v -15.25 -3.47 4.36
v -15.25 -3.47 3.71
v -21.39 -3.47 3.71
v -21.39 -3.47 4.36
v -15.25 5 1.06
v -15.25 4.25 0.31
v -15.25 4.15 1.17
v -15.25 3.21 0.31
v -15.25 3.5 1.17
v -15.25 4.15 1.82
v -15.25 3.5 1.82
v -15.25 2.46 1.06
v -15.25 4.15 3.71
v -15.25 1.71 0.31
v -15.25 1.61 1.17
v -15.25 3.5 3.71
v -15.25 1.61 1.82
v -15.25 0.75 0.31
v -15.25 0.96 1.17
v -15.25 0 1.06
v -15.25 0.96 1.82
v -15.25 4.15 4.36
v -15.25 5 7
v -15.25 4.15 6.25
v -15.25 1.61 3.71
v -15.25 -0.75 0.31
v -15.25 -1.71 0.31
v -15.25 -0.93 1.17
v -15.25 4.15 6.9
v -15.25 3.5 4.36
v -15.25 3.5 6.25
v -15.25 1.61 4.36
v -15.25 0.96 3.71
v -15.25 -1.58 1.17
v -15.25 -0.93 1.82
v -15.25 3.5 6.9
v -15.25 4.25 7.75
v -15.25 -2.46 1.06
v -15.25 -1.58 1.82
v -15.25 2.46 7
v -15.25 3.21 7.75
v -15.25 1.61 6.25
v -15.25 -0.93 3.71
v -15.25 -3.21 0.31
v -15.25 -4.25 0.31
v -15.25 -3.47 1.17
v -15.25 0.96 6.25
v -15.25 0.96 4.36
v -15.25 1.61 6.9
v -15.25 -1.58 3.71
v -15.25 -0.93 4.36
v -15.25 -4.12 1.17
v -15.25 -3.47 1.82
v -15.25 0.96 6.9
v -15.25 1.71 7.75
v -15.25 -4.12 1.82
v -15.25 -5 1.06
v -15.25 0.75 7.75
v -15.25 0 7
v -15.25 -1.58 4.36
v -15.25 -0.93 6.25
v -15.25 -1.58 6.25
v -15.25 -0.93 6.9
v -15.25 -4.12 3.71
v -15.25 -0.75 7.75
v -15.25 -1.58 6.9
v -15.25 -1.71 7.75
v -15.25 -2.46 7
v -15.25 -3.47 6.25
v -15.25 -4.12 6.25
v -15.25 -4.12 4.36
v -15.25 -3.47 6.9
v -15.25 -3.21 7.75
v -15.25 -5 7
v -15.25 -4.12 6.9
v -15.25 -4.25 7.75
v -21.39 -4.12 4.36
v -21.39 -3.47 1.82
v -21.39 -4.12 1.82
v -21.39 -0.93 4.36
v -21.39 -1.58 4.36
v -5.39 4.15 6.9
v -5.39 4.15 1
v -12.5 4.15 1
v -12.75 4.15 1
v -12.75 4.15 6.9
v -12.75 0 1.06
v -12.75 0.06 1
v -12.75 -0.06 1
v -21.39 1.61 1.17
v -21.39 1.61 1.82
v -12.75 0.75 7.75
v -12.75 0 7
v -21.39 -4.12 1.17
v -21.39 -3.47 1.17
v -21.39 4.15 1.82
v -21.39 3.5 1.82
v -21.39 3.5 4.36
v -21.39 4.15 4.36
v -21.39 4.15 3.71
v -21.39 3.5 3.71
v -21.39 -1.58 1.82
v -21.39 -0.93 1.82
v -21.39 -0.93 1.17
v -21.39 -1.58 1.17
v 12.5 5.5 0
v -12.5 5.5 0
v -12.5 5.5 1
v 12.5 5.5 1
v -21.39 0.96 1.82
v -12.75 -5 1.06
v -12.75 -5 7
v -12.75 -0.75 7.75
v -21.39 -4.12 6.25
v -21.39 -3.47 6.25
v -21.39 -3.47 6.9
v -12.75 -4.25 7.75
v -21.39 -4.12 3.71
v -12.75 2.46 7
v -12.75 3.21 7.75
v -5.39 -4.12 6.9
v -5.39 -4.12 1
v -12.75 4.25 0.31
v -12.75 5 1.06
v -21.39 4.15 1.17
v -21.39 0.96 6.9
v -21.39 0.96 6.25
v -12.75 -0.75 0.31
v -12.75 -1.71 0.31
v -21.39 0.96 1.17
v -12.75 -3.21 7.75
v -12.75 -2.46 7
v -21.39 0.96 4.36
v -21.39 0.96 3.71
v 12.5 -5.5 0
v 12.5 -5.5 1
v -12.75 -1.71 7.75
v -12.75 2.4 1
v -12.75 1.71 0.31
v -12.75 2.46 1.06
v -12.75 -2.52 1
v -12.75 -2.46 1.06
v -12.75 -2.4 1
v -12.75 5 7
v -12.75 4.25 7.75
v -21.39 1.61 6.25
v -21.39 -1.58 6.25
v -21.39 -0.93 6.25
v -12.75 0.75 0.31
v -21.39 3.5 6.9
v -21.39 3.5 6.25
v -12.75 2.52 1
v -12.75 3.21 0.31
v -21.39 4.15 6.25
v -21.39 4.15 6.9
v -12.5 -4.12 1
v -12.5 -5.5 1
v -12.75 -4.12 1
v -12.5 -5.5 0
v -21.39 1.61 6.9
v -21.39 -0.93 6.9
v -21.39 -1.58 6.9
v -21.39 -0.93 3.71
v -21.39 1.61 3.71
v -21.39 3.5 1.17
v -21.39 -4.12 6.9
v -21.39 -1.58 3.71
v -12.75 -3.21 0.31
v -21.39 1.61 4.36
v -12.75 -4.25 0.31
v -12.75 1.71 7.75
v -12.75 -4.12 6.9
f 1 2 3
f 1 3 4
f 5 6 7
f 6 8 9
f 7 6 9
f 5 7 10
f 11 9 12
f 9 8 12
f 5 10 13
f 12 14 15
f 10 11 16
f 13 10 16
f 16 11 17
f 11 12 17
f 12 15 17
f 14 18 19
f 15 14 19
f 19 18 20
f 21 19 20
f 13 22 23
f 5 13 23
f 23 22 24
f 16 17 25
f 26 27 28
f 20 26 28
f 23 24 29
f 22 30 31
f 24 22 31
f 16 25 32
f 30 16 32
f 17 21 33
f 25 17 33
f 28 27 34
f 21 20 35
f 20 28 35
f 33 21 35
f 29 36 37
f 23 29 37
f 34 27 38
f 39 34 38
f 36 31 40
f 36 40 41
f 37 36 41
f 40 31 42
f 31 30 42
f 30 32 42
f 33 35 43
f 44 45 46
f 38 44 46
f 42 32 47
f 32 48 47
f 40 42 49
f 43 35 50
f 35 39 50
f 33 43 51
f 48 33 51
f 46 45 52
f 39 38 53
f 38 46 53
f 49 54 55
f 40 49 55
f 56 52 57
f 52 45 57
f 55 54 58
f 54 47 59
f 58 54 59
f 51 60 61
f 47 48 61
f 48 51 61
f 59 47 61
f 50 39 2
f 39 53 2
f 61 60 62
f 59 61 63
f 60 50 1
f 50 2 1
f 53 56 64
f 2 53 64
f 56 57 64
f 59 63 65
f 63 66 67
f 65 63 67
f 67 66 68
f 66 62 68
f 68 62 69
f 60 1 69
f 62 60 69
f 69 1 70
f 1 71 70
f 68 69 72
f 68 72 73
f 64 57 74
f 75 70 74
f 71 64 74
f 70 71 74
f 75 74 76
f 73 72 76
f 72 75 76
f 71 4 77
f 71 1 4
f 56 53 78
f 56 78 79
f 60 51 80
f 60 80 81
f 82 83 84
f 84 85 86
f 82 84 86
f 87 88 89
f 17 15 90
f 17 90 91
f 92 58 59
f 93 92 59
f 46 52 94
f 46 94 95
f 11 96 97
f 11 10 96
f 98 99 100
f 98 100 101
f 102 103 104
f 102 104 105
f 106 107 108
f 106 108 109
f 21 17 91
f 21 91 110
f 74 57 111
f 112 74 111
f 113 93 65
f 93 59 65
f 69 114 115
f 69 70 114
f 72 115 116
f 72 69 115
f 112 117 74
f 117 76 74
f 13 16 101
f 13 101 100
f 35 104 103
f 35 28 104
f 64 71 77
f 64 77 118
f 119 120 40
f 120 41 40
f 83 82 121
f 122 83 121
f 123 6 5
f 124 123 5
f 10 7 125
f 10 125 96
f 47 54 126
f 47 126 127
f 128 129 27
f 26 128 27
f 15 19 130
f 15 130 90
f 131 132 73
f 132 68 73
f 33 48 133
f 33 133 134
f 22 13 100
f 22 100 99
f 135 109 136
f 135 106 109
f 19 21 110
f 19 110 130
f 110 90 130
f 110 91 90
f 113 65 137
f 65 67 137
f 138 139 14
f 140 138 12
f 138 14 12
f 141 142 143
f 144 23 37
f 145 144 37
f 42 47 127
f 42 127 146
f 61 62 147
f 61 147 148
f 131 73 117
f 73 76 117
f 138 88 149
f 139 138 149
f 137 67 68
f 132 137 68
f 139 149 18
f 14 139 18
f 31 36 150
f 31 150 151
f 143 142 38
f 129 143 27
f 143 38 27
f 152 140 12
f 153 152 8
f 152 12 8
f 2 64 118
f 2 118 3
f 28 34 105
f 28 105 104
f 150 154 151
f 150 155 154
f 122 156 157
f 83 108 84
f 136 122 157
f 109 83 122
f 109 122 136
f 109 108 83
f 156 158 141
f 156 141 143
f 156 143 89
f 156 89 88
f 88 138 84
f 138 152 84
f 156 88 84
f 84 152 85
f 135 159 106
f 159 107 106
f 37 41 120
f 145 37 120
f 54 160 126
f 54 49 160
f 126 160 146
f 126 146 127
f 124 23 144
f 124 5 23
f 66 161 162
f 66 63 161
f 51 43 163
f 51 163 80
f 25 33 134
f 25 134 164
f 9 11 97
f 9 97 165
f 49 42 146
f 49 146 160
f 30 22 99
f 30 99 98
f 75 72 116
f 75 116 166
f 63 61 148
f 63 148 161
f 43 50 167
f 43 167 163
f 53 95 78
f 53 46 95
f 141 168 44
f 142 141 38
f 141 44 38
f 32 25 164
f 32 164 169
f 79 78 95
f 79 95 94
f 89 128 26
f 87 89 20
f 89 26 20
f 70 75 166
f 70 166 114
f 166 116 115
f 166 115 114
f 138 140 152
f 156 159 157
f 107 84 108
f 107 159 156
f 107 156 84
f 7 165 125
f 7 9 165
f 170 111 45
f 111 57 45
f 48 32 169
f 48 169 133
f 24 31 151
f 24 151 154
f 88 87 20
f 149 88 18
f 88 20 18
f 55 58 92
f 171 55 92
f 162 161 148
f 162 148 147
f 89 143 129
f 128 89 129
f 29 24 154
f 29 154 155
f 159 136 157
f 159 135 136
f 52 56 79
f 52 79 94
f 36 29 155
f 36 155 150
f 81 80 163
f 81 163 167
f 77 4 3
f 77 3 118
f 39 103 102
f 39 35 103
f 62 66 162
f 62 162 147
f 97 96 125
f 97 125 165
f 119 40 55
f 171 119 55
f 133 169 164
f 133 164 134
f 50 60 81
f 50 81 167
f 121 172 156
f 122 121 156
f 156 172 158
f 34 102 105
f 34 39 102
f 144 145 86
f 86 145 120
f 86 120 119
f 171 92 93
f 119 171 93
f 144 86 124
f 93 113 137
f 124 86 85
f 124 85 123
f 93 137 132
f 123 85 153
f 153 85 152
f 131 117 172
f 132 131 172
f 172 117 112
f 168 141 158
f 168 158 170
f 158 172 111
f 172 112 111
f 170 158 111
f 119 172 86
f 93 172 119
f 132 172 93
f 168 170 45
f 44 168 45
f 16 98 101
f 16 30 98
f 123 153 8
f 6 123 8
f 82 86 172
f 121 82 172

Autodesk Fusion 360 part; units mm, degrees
sketch "Sketch1" plane through (0, 0, 0) normal (0, 0, 1) x (1, 0, 0)
  line L0 (-12.5, 5.5) -> (12.5, 5.5)
  line L1 (12.5, 5.5) -> (12.5, -5.5)
  line L2 (12.5, -5.5) -> (-12.5, -5.5)
  line L3 (-12.5, -5.5) -> (-12.5, 5.5)
  line L4 (-12.5, 5.5) -> (12.5, -5.5) construction
  line L5 (12.5, 5.5) -> (-12.5, -5.5) construction
  line L6 (-12.5, 5.5) -> (-21.5, 5.5) construction
  line L7 (-21.5, 5.5) -> (-21.5, -5.5) construction
  line L8 (-21.5, -5.5) -> (-12.5, -5.5) construction
  dimension "d1" = 11
  dimension "d2" = 25
  dimension "d5" = 34
extrude "Extrude1" add sketch "Sketch1" along normal blind 1 makes body 1
sketch "Sketch2" plane through (0, 0, 0) normal (0, 1, 0) x (1, 0, 0)
  line L0 (-15.25, -7.75) -> (-12.75, -7.75)
  line L1 (-12.75, -7.75) -> (-12.75, -0.31)
  line L2 (-12.75, -0.31) -> (-15.25, -0.31)
  line L3 (-15.25, -0.31) -> (-15.25, -7.75)
  point P0 (12.5, 0)
  dimension "d6" = 2.5
  dimension "d7" = 7.44
  dimension "d8" = 7.75
  dimension "d9" = 27.75
extrude "Extrude2" add sketch "Sketch2" along normal mid plane 10 separate body makes body 2
sketch "Sketch3" plane through (-15.25, 0, 0) normal (-1, 0, 0) x (0, -1, 0)
  line L0 (5, 7.75) -> (-5, 7.75)
  line L1 (-5, 7.75) -> (-5, 0.31)
  line L2 (-5, 0.31) -> (5, 0.31)
  line L3 (5, 0.31) -> (5, 7.75)
  line L4 (-4.15, 6.9) -> (-3.5, 6.9)
  line L5 (-3.5, 6.9) -> (-3.5, 6.25)
  line L6 (-3.5, 6.25) -> (-4.15, 6.25)
  line L7 (-4.15, 6.25) -> (-4.15, 6.9)
  line L8 (-1.61, 6.9) -> (-0.96, 6.9)
  line L9 (-0.96, 6.9) -> (-0.96, 6.25)
  line L10 (-0.96, 6.25) -> (-1.61, 6.25)
  line L11 (-1.61, 6.25) -> (-1.61, 6.9)
  line L12 (0.93, 6.9) -> (1.58, 6.9)
  line L13 (1.58, 6.9) -> (1.58, 6.25)
  line L14 (1.58, 6.25) -> (0.93, 6.25)
  line L15 (0.93, 6.25) -> (0.93, 6.9)
  line L16 (3.47, 6.9) -> (4.12, 6.9)
  line L17 (4.12, 6.9) -> (4.12, 6.25)
  line L18 (4.12, 6.25) -> (3.47, 6.25)
  line L19 (3.47, 6.25) -> (3.47, 6.9)
  line L20 (-4.15, 4.36) -> (-3.5, 4.36)
  line L21 (-3.5, 4.36) -> (-3.5, 3.71)
  line L22 (-3.5, 3.71) -> (-4.15, 3.71)
  line L23 (-4.15, 3.71) -> (-4.15, 4.36)
  line L24 (-1.61, 4.36) -> (-0.96, 4.36)
  line L25 (-0.96, 4.36) -> (-0.96, 3.71)
  line L26 (-0.96, 3.71) -> (-1.61, 3.71)
  line L27 (-1.61, 3.71) -> (-1.61, 4.36)
  line L28 (0.93, 4.36) -> (1.58, 4.36)
  line L29 (1.58, 4.36) -> (1.58, 3.71)
  line L30 (1.58, 3.71) -> (0.93, 3.71)
  line L31 (0.93, 3.71) -> (0.93, 4.36)
  line L32 (3.47, 4.36) -> (4.12, 4.36)
  line L33 (4.12, 4.36) -> (4.12, 3.71)
  line L34 (4.12, 3.71) -> (3.47, 3.71)
  line L35 (3.47, 3.71) -> (3.47, 4.36)
  line L36 (-4.15, 1.82) -> (-3.5, 1.82)
  line L37 (-3.5, 1.82) -> (-3.5, 1.17)
  line L38 (-3.5, 1.17) -> (-4.15, 1.17)
  line L39 (-4.15, 1.17) -> (-4.15, 1.82)
  line L40 (-1.61, 1.82) -> (-0.96, 1.82)
  line L41 (-0.96, 1.82) -> (-0.96, 1.17)
  line L42 (-0.96, 1.17) -> (-1.61, 1.17)
  line L43 (-1.61, 1.17) -> (-1.61, 1.82)
  line L44 (0.93, 1.82) -> (1.58, 1.82)
  line L45 (1.58, 1.82) -> (1.58, 1.17)
  line L46 (1.58, 1.17) -> (0.93, 1.17)
  line L47 (0.93, 1.17) -> (0.93, 1.82)
  line L48 (3.47, 1.82) -> (4.12, 1.82)
  line L49 (4.12, 1.82) -> (4.12, 1.17)
  line L50 (4.12, 1.17) -> (3.47, 1.17)
  line L51 (3.47, 1.17) -> (3.47, 1.82)
  line L52 (-5, 7) -> (-4.25, 7.75)
  line L53 (-3.21, 7.75) -> (-2.46, 7)
  line L54 (-2.46, 7) -> (-1.71, 7.75)
  line L55 (-0.75, 7.75) -> (0, 7)
  line L56 (0, 7) -> (0.7523, 7.7523)
  line L57 (1.71, 7.75) -> (2.46, 7)
  line L58 (2.46, 7) -> (3.21, 7.75)
  line L59 (4.25, 7.75) -> (5, 7)
  line L60 (-5, 7) -> (5, 7) construction
  line L61 (-5, 7) -> (-5, 8.8118)
  line L62 (-5, 8.8118) -> (5, 8.8118)
  line L63 (5, 8.8118) -> (5, 7)
  line L64 (-4.25, 7.75) -> (-3.21, 7.75)
  line L65 (-1.71, 7.75) -> (-0.75, 7.75)
  line L66 (0.7523, 7.7523) -> (1.71, 7.75)
  line L67 (3.21, 7.75) -> (4.25, 7.75)
  line L68 (-5, 1.06) -> (5, 1.06) construction
  line L69 (-5, 1.06) -> (-5, -0.1236)
  line L70 (-5, -0.1236) -> (5, -0.1236)
  line L71 (5, -0.1236) -> (5, 1.06)
  line L72 (5, 1.06) -> (4.25, 0.31)
  line L73 (4.25, 0.31) -> (3.21, 0.31)
  line L74 (3.21, 0.31) -> (2.46, 1.06)
  line L75 (2.46, 1.06) -> (1.71, 0.31)
  line L76 (1.71, 0.31) -> (0.75, 0.31)
  line L77 (0.75, 0.31) -> (0, 1.06)
  line L78 (0, 1.06) -> (-0.75, 0.31)
  line L79 (-0.75, 0.31) -> (-1.71, 0.31)
  line L80 (-1.71, 0.31) -> (-2.46, 1.06)
  line L81 (-2.46, 1.06) -> (-3.21, 0.31)
  line L82 (-3.21, 0.31) -> (-4.25, 0.31)
  line L83 (-4.25, 0.31) -> (-5, 1.06)
  line L84 (-4.15, 6.9) -> (4.12, 6.9)
  line L85 (4.12, 6.9) -> (4.12, 1)
  line L86 (4.12, 1) -> (-4.15, 1)
  line L87 (-4.15, 1) -> (-4.15, 6.9)
  line L88 (-5.5, 1) -> (5.5, 1)
  dimension "d12" = 0.65
  dimension "d13" = 0.65
  dimension "d16" = 2.54
  dimension "d17" = -2.54
  dimension "d18" = 0.85
  dimension "d19" = 0.85
  dimension "d20" = 0.75
  dimension "d21" = 90
  dimension "d22" = 45
  dimension "d23" = 90
  dimension "d24" = 90
  dimension "d25" = 45
  dimension "d26" = 2.54
  dimension "d27" = 2.54
  dimension "d28" = 0.75
extrude "Extrude3" cut sketch "Sketch3" against normal blind 3 contours L0 L3 L59 L63 | L0 L56 L61 L62 L63 L64 L65 L66 L67 | L0 L57 L58 | L3 L71 L72 L88 | L2 L3 L71 L72 L88 | L0 L1 L52 L61 | L0 L55 L56 | L2 L69 L70 L71 L73 L76 L79 L82 | L2 L74 L75 L86 L88 | L74 L75 L86 L88 | L0 L53 L54 | L1 L69 L83 L88 | L1 L2 L69 L83 L88 | L2 L77 L78 L86 L88 | L77 L78 L86 L88 | L2 L80 L81 L86 L88 | L80 L81 L86 L88 bodies 2
extrude "Extrude4" add sketch "Sketch3" along normal blind 6.14 contours L48 L49 L50 L51 L85 | L32 L33 L34 L35 L85 | L36 L37 L38 L39 L87 | L16 L17 L18 L19 L84 L85 | L20 L21 L22 L23 L87 | L12 L13 L14 L15 L84 | L4 L5 L6 L7 L84 L87 | L8 L9 L10 L11 L84 | L24 L25 L26 L27 | L28 L29 L30 L31 | L40 L41 L42 L43 | L44 L45 L46 L47 bodies 2
extrude "Extrude5" add sketch "Sketch3" against normal blind 7.36 from surface at -2.5 contours L5 L6 L9 L10 L11 L13 L14 L15 L18 L19 L20 L21 L22 L32 L34 L35 L36 L37 L38 L48 L50 L51 L74 L75 L77 L78 L80 L81 L84 L85 L86 L87 L88 | L48 L49 L50 L51 L85 | L74 L75 L86 L88 | L32 L33 L34 L35 L85 | L77 L78 L86 L88 | L80 L81 L86 L88 | L36 L37 L38 L39 L87 | L16 L17 L18 L19 L84 L85 | L20 L21 L22 L23 L87 | L12 L13 L14 L15 L84 | L4 L5 L6 L7 L84 L87 | L8 L9 L10 L11 L84 | L24 L25 L26 L27 | L28 L29 L30 L31 | L40 L41 L42 L43 | L44 L45 L46 L47 bodies 1 2
equation "d28 = d20"
